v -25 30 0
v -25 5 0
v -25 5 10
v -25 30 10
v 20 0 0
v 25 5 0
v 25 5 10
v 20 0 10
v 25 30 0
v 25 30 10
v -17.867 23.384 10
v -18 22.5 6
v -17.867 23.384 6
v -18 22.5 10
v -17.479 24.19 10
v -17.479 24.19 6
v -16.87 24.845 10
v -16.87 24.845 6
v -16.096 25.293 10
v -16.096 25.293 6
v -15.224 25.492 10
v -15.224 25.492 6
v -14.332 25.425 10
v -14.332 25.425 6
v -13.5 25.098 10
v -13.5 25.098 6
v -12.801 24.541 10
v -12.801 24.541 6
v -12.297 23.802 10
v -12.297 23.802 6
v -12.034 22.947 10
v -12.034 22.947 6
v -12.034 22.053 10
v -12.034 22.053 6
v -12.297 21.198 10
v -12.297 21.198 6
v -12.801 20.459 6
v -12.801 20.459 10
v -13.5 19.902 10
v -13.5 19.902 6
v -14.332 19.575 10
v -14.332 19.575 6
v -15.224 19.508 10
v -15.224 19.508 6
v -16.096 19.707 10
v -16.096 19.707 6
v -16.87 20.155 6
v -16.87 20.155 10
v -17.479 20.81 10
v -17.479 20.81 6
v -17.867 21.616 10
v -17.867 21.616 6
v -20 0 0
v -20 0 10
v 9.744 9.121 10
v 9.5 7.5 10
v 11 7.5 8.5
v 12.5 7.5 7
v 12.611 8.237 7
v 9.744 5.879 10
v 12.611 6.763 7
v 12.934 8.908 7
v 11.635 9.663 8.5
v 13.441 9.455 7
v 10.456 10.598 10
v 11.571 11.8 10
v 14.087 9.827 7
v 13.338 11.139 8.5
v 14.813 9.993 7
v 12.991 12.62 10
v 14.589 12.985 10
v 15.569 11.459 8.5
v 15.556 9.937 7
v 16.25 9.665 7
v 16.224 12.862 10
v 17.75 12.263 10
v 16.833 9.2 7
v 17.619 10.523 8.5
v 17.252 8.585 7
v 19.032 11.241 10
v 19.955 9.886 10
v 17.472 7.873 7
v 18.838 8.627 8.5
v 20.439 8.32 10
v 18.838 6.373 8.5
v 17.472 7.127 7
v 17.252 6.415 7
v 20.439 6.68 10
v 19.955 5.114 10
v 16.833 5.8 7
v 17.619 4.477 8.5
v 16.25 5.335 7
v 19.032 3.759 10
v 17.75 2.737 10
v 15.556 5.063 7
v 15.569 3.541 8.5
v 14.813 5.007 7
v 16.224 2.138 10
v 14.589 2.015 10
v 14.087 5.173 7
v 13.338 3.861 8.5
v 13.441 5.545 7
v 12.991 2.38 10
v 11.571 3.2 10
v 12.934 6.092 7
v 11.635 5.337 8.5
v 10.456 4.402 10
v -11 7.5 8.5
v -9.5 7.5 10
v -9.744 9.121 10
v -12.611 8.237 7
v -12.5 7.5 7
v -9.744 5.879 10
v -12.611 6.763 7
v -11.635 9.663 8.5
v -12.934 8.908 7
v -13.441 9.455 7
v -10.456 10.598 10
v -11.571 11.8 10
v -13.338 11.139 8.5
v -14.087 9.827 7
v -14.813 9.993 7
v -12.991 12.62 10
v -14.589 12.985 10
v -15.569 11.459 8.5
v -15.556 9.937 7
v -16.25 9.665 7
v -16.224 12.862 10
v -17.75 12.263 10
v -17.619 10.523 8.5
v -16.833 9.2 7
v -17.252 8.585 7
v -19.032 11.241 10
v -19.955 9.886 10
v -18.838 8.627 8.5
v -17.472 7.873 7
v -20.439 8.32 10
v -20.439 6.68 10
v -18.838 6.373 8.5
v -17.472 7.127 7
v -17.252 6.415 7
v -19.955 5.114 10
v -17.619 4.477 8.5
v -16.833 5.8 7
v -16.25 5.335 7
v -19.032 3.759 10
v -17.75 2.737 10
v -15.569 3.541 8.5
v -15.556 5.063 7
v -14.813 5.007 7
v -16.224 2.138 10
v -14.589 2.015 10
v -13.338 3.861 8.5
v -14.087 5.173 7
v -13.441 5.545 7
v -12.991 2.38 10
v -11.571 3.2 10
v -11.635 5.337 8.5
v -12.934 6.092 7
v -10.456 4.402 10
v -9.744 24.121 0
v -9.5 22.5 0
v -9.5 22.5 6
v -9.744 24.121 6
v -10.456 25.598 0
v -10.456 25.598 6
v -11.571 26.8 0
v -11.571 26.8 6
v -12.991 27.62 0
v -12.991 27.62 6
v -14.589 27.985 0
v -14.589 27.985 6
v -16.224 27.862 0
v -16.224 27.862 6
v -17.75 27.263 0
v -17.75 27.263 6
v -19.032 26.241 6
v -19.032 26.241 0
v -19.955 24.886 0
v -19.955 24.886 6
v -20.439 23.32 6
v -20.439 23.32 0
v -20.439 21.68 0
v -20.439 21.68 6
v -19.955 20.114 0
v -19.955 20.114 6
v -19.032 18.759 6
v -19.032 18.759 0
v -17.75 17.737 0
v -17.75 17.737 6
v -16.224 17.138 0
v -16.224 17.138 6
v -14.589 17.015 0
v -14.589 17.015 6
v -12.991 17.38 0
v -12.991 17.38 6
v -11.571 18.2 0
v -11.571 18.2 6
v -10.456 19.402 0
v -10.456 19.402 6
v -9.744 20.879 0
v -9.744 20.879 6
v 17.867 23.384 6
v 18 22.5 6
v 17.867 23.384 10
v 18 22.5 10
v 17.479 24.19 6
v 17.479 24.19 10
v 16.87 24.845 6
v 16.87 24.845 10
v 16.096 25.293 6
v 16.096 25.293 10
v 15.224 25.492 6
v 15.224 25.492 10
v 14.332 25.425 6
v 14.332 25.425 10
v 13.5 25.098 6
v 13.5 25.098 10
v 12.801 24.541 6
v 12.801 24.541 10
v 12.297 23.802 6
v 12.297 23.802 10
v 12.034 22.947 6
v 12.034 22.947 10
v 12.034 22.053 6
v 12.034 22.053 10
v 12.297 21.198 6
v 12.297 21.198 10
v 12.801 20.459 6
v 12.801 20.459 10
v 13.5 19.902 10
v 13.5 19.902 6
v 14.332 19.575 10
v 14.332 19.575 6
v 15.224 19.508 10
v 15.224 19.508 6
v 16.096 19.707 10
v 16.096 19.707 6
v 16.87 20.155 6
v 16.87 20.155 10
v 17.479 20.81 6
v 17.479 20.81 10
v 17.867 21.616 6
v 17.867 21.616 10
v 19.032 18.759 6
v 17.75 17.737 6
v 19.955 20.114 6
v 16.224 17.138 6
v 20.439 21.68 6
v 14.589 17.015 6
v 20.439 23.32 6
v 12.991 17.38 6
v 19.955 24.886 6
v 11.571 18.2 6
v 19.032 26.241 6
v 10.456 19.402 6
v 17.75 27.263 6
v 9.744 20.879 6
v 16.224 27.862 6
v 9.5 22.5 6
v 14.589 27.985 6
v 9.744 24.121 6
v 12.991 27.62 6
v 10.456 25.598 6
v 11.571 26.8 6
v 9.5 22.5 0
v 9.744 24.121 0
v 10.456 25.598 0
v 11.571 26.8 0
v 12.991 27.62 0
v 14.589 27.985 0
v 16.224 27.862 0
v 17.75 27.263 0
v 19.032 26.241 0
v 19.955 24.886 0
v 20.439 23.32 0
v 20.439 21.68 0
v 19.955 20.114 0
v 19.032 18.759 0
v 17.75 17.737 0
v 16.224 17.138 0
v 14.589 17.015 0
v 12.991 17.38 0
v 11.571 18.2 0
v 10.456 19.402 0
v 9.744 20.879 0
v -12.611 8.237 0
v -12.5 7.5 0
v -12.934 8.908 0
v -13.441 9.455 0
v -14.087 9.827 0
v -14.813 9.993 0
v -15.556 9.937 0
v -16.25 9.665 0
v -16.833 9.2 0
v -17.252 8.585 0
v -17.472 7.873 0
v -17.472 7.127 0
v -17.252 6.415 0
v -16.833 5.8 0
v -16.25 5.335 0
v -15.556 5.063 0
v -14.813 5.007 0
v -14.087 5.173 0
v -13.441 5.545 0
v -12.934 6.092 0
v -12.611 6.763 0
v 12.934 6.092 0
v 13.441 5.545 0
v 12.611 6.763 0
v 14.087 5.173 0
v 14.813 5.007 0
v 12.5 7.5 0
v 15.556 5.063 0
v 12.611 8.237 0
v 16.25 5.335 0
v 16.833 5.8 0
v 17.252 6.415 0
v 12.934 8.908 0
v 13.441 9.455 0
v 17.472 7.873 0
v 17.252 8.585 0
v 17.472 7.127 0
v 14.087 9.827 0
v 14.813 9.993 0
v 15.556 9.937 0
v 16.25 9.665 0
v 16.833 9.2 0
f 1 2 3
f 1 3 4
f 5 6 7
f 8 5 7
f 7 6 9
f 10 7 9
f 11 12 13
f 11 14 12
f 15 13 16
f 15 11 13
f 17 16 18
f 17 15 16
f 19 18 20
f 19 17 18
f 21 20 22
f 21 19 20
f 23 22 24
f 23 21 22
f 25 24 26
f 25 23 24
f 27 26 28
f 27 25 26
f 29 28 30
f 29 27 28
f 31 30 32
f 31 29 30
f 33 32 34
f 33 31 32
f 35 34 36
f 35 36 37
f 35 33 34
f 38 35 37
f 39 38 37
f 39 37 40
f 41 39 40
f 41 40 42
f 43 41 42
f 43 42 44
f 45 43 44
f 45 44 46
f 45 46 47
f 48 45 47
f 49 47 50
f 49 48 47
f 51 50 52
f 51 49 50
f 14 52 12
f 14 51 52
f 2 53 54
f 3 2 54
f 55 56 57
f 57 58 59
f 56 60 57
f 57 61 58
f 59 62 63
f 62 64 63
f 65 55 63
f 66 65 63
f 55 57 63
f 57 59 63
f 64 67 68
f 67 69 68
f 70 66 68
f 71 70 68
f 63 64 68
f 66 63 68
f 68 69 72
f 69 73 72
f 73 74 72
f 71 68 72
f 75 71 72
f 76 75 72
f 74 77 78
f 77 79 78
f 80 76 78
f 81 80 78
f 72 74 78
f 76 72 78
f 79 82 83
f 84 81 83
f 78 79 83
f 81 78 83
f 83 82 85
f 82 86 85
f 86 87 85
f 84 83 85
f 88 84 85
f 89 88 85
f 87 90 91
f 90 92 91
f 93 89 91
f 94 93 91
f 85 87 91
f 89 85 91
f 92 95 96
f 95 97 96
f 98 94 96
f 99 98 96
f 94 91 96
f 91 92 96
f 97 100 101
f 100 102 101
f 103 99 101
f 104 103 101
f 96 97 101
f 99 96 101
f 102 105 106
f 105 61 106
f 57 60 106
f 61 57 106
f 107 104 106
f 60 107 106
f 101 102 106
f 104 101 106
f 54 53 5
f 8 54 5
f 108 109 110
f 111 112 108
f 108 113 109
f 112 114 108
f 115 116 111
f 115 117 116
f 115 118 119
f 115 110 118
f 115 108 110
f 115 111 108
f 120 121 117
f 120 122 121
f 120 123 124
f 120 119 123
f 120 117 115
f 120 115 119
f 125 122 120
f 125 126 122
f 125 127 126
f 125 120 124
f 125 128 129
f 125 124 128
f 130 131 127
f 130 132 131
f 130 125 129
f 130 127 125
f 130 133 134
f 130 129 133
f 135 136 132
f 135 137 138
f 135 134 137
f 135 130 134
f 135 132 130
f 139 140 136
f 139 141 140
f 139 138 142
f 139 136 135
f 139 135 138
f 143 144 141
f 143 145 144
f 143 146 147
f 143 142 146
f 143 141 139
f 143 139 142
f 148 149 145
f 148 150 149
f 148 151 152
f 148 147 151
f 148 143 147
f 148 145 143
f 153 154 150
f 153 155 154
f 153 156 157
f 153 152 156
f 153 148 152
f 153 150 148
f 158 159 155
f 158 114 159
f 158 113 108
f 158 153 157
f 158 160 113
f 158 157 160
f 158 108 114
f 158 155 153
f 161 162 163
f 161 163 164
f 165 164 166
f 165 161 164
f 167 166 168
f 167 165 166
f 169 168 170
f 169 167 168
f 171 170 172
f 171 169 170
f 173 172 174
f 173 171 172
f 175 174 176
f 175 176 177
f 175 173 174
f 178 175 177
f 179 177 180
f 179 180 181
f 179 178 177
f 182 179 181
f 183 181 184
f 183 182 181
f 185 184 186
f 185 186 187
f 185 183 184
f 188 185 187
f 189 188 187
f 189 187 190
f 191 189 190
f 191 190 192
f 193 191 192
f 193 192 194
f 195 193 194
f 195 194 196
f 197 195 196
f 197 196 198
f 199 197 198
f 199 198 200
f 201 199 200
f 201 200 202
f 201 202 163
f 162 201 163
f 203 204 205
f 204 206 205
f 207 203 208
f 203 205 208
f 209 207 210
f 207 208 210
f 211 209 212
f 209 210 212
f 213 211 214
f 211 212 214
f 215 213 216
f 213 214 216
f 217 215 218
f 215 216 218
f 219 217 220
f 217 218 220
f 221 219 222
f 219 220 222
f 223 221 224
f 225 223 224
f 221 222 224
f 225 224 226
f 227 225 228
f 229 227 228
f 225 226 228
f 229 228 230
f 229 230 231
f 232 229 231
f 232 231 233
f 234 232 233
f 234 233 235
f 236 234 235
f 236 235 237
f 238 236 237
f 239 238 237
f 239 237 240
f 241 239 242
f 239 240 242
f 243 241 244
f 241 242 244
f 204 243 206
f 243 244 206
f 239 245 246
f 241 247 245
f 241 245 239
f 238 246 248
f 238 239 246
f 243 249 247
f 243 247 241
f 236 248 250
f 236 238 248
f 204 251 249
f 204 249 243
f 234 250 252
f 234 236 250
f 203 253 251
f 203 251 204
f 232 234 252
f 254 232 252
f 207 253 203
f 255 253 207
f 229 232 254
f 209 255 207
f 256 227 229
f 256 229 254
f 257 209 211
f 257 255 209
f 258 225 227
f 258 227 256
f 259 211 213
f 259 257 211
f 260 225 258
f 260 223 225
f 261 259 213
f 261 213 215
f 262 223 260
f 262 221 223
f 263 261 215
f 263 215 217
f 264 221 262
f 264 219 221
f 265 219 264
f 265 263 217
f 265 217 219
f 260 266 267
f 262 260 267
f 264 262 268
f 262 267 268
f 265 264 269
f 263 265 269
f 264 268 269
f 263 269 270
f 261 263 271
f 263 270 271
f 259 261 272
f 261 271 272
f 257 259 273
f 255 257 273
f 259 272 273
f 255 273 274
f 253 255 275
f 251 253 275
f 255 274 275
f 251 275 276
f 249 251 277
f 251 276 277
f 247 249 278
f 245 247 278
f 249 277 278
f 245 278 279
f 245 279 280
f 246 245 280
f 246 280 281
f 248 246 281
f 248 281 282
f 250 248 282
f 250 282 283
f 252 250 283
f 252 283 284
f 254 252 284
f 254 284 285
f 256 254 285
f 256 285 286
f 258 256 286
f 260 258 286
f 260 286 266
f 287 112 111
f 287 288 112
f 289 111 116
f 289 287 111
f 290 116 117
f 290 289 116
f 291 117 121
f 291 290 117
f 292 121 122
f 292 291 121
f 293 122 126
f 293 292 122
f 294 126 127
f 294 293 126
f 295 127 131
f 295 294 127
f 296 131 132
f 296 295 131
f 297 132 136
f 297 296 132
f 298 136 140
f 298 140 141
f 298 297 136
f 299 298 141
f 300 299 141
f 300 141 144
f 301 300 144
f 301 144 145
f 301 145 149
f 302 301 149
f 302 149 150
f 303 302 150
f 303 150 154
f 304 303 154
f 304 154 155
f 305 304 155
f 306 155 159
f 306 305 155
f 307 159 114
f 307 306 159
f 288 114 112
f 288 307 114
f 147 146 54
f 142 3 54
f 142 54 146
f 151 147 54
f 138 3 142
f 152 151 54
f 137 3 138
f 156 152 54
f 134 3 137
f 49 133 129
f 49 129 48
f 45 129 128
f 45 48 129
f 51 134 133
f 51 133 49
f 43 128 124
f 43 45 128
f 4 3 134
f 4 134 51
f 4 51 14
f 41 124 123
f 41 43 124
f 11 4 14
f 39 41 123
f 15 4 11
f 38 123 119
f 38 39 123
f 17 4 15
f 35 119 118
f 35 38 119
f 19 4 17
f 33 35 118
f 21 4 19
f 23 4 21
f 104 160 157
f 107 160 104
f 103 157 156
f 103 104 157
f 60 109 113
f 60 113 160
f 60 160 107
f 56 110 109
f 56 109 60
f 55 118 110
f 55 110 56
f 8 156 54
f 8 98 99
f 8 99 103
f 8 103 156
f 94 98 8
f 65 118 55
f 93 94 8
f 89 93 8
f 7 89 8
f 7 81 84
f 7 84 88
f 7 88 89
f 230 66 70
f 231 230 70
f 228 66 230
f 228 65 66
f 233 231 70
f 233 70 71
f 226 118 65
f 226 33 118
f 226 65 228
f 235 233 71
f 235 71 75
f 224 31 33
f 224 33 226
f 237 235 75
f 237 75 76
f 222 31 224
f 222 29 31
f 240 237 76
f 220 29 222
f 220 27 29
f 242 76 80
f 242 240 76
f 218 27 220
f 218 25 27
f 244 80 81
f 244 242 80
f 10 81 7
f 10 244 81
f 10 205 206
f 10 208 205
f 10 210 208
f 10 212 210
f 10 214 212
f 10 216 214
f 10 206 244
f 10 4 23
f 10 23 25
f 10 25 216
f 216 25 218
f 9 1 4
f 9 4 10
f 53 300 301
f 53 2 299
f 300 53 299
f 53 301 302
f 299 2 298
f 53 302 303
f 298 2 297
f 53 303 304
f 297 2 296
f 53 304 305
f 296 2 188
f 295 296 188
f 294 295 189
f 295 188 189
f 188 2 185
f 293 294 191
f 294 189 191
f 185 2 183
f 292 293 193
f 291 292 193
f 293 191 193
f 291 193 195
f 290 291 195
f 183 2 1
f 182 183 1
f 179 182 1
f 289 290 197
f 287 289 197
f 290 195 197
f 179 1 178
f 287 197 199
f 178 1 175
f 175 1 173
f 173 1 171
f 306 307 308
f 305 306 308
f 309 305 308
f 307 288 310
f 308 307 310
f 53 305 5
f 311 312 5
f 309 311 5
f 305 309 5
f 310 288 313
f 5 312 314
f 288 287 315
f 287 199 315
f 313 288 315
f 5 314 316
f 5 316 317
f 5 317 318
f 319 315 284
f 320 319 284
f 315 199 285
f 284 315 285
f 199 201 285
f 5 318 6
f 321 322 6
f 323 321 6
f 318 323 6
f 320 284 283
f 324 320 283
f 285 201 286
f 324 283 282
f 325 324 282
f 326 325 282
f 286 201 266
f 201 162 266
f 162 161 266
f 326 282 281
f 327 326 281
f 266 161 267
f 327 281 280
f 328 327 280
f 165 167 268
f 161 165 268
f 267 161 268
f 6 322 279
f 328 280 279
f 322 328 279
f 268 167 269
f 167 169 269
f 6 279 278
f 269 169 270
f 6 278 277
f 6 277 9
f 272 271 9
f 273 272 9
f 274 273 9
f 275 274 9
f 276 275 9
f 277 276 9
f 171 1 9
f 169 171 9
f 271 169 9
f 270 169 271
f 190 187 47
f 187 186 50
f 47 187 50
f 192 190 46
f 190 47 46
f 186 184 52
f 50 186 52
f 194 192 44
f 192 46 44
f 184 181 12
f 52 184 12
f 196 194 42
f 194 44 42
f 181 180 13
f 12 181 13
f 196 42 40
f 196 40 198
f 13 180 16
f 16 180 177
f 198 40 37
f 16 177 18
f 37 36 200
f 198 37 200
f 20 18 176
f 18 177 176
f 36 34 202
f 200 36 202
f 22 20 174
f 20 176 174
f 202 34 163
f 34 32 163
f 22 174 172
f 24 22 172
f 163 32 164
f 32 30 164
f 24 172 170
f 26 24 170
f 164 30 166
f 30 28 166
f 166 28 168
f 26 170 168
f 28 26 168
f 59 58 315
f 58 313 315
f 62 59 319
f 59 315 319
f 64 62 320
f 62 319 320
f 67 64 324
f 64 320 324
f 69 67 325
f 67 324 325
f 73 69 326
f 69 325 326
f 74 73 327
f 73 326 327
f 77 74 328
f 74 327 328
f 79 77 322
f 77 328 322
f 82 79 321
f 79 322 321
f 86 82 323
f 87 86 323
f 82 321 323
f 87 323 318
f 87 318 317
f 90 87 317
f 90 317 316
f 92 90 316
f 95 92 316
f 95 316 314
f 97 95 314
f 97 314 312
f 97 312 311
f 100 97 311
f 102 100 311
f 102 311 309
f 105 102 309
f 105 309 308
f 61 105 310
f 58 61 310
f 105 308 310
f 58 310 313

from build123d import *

# Parameters (mm, degrees)
ESQUISSE1_W          = 50
ESQUISSE1_H          = 30
BASE_EXTRUSION_DEPTH = 10
PER_AGE1_D           = 5
PER_AGE1_CSINK_D     = 11
PER_AGE1_CSINK_ANGLE = 90
PER_AGE2_D           = 6
PER_AGE2_CBORE_D     = 11
PER_AGE2_CBORE_DEPTH = 6
CHANFREIN1_SIZE      = 5


with BuildPart() as part:
    # Esquisse1 → Base-Extrusion (new body)
    with BuildSketch(Plane.XY):
        with Locations((0, 15)):
            Rectangle(ESQUISSE1_W, ESQUISSE1_H)
    extrude(amount=BASE_EXTRUSION_DEPTH)

    # Perçage1 (through all)
    with Locations(Plane.XY.offset(10)):
        with Locations((15, 7.5)):
            per_age1 = CounterSinkHole(PER_AGE1_D / 2, PER_AGE1_CSINK_D / 2, counter_sink_angle=PER_AGE1_CSINK_ANGLE)

    # Symétrie1: Perçage1 across plane
    add(per_age1.mirror(Plane(origin=(0, 0, 0), x_dir=(0, 0, 1), z_dir=(1, 0, 0))), mode=Mode.SUBTRACT)

    # Perçage2 (through all)
    with Locations(Plane(origin=(0, 0, 0), x_dir=(-1, 0, 0), z_dir=(0, 0, -1))):
        with Locations((-15, 22.5)):
            per_age2 = CounterBoreHole(PER_AGE2_D / 2, PER_AGE2_CBORE_D / 2, PER_AGE2_CBORE_DEPTH)

    # Symétrie2: Perçage2 across plane
    add(per_age2.mirror(Plane(origin=(0, 0, 0), x_dir=(0, 0, 1), z_dir=(1, 0, 0))), mode=Mode.SUBTRACT)

    # Chanfrein1
    chanfrein1_edges = [part.edges().sort_by_distance(p)[0] for p in [
        (-25, 0, 5),
        (25, 0, 5),
    ]]
    chamfer(chanfrein1_edges, length=CHANFREIN1_SIZE)


solid = part.part
